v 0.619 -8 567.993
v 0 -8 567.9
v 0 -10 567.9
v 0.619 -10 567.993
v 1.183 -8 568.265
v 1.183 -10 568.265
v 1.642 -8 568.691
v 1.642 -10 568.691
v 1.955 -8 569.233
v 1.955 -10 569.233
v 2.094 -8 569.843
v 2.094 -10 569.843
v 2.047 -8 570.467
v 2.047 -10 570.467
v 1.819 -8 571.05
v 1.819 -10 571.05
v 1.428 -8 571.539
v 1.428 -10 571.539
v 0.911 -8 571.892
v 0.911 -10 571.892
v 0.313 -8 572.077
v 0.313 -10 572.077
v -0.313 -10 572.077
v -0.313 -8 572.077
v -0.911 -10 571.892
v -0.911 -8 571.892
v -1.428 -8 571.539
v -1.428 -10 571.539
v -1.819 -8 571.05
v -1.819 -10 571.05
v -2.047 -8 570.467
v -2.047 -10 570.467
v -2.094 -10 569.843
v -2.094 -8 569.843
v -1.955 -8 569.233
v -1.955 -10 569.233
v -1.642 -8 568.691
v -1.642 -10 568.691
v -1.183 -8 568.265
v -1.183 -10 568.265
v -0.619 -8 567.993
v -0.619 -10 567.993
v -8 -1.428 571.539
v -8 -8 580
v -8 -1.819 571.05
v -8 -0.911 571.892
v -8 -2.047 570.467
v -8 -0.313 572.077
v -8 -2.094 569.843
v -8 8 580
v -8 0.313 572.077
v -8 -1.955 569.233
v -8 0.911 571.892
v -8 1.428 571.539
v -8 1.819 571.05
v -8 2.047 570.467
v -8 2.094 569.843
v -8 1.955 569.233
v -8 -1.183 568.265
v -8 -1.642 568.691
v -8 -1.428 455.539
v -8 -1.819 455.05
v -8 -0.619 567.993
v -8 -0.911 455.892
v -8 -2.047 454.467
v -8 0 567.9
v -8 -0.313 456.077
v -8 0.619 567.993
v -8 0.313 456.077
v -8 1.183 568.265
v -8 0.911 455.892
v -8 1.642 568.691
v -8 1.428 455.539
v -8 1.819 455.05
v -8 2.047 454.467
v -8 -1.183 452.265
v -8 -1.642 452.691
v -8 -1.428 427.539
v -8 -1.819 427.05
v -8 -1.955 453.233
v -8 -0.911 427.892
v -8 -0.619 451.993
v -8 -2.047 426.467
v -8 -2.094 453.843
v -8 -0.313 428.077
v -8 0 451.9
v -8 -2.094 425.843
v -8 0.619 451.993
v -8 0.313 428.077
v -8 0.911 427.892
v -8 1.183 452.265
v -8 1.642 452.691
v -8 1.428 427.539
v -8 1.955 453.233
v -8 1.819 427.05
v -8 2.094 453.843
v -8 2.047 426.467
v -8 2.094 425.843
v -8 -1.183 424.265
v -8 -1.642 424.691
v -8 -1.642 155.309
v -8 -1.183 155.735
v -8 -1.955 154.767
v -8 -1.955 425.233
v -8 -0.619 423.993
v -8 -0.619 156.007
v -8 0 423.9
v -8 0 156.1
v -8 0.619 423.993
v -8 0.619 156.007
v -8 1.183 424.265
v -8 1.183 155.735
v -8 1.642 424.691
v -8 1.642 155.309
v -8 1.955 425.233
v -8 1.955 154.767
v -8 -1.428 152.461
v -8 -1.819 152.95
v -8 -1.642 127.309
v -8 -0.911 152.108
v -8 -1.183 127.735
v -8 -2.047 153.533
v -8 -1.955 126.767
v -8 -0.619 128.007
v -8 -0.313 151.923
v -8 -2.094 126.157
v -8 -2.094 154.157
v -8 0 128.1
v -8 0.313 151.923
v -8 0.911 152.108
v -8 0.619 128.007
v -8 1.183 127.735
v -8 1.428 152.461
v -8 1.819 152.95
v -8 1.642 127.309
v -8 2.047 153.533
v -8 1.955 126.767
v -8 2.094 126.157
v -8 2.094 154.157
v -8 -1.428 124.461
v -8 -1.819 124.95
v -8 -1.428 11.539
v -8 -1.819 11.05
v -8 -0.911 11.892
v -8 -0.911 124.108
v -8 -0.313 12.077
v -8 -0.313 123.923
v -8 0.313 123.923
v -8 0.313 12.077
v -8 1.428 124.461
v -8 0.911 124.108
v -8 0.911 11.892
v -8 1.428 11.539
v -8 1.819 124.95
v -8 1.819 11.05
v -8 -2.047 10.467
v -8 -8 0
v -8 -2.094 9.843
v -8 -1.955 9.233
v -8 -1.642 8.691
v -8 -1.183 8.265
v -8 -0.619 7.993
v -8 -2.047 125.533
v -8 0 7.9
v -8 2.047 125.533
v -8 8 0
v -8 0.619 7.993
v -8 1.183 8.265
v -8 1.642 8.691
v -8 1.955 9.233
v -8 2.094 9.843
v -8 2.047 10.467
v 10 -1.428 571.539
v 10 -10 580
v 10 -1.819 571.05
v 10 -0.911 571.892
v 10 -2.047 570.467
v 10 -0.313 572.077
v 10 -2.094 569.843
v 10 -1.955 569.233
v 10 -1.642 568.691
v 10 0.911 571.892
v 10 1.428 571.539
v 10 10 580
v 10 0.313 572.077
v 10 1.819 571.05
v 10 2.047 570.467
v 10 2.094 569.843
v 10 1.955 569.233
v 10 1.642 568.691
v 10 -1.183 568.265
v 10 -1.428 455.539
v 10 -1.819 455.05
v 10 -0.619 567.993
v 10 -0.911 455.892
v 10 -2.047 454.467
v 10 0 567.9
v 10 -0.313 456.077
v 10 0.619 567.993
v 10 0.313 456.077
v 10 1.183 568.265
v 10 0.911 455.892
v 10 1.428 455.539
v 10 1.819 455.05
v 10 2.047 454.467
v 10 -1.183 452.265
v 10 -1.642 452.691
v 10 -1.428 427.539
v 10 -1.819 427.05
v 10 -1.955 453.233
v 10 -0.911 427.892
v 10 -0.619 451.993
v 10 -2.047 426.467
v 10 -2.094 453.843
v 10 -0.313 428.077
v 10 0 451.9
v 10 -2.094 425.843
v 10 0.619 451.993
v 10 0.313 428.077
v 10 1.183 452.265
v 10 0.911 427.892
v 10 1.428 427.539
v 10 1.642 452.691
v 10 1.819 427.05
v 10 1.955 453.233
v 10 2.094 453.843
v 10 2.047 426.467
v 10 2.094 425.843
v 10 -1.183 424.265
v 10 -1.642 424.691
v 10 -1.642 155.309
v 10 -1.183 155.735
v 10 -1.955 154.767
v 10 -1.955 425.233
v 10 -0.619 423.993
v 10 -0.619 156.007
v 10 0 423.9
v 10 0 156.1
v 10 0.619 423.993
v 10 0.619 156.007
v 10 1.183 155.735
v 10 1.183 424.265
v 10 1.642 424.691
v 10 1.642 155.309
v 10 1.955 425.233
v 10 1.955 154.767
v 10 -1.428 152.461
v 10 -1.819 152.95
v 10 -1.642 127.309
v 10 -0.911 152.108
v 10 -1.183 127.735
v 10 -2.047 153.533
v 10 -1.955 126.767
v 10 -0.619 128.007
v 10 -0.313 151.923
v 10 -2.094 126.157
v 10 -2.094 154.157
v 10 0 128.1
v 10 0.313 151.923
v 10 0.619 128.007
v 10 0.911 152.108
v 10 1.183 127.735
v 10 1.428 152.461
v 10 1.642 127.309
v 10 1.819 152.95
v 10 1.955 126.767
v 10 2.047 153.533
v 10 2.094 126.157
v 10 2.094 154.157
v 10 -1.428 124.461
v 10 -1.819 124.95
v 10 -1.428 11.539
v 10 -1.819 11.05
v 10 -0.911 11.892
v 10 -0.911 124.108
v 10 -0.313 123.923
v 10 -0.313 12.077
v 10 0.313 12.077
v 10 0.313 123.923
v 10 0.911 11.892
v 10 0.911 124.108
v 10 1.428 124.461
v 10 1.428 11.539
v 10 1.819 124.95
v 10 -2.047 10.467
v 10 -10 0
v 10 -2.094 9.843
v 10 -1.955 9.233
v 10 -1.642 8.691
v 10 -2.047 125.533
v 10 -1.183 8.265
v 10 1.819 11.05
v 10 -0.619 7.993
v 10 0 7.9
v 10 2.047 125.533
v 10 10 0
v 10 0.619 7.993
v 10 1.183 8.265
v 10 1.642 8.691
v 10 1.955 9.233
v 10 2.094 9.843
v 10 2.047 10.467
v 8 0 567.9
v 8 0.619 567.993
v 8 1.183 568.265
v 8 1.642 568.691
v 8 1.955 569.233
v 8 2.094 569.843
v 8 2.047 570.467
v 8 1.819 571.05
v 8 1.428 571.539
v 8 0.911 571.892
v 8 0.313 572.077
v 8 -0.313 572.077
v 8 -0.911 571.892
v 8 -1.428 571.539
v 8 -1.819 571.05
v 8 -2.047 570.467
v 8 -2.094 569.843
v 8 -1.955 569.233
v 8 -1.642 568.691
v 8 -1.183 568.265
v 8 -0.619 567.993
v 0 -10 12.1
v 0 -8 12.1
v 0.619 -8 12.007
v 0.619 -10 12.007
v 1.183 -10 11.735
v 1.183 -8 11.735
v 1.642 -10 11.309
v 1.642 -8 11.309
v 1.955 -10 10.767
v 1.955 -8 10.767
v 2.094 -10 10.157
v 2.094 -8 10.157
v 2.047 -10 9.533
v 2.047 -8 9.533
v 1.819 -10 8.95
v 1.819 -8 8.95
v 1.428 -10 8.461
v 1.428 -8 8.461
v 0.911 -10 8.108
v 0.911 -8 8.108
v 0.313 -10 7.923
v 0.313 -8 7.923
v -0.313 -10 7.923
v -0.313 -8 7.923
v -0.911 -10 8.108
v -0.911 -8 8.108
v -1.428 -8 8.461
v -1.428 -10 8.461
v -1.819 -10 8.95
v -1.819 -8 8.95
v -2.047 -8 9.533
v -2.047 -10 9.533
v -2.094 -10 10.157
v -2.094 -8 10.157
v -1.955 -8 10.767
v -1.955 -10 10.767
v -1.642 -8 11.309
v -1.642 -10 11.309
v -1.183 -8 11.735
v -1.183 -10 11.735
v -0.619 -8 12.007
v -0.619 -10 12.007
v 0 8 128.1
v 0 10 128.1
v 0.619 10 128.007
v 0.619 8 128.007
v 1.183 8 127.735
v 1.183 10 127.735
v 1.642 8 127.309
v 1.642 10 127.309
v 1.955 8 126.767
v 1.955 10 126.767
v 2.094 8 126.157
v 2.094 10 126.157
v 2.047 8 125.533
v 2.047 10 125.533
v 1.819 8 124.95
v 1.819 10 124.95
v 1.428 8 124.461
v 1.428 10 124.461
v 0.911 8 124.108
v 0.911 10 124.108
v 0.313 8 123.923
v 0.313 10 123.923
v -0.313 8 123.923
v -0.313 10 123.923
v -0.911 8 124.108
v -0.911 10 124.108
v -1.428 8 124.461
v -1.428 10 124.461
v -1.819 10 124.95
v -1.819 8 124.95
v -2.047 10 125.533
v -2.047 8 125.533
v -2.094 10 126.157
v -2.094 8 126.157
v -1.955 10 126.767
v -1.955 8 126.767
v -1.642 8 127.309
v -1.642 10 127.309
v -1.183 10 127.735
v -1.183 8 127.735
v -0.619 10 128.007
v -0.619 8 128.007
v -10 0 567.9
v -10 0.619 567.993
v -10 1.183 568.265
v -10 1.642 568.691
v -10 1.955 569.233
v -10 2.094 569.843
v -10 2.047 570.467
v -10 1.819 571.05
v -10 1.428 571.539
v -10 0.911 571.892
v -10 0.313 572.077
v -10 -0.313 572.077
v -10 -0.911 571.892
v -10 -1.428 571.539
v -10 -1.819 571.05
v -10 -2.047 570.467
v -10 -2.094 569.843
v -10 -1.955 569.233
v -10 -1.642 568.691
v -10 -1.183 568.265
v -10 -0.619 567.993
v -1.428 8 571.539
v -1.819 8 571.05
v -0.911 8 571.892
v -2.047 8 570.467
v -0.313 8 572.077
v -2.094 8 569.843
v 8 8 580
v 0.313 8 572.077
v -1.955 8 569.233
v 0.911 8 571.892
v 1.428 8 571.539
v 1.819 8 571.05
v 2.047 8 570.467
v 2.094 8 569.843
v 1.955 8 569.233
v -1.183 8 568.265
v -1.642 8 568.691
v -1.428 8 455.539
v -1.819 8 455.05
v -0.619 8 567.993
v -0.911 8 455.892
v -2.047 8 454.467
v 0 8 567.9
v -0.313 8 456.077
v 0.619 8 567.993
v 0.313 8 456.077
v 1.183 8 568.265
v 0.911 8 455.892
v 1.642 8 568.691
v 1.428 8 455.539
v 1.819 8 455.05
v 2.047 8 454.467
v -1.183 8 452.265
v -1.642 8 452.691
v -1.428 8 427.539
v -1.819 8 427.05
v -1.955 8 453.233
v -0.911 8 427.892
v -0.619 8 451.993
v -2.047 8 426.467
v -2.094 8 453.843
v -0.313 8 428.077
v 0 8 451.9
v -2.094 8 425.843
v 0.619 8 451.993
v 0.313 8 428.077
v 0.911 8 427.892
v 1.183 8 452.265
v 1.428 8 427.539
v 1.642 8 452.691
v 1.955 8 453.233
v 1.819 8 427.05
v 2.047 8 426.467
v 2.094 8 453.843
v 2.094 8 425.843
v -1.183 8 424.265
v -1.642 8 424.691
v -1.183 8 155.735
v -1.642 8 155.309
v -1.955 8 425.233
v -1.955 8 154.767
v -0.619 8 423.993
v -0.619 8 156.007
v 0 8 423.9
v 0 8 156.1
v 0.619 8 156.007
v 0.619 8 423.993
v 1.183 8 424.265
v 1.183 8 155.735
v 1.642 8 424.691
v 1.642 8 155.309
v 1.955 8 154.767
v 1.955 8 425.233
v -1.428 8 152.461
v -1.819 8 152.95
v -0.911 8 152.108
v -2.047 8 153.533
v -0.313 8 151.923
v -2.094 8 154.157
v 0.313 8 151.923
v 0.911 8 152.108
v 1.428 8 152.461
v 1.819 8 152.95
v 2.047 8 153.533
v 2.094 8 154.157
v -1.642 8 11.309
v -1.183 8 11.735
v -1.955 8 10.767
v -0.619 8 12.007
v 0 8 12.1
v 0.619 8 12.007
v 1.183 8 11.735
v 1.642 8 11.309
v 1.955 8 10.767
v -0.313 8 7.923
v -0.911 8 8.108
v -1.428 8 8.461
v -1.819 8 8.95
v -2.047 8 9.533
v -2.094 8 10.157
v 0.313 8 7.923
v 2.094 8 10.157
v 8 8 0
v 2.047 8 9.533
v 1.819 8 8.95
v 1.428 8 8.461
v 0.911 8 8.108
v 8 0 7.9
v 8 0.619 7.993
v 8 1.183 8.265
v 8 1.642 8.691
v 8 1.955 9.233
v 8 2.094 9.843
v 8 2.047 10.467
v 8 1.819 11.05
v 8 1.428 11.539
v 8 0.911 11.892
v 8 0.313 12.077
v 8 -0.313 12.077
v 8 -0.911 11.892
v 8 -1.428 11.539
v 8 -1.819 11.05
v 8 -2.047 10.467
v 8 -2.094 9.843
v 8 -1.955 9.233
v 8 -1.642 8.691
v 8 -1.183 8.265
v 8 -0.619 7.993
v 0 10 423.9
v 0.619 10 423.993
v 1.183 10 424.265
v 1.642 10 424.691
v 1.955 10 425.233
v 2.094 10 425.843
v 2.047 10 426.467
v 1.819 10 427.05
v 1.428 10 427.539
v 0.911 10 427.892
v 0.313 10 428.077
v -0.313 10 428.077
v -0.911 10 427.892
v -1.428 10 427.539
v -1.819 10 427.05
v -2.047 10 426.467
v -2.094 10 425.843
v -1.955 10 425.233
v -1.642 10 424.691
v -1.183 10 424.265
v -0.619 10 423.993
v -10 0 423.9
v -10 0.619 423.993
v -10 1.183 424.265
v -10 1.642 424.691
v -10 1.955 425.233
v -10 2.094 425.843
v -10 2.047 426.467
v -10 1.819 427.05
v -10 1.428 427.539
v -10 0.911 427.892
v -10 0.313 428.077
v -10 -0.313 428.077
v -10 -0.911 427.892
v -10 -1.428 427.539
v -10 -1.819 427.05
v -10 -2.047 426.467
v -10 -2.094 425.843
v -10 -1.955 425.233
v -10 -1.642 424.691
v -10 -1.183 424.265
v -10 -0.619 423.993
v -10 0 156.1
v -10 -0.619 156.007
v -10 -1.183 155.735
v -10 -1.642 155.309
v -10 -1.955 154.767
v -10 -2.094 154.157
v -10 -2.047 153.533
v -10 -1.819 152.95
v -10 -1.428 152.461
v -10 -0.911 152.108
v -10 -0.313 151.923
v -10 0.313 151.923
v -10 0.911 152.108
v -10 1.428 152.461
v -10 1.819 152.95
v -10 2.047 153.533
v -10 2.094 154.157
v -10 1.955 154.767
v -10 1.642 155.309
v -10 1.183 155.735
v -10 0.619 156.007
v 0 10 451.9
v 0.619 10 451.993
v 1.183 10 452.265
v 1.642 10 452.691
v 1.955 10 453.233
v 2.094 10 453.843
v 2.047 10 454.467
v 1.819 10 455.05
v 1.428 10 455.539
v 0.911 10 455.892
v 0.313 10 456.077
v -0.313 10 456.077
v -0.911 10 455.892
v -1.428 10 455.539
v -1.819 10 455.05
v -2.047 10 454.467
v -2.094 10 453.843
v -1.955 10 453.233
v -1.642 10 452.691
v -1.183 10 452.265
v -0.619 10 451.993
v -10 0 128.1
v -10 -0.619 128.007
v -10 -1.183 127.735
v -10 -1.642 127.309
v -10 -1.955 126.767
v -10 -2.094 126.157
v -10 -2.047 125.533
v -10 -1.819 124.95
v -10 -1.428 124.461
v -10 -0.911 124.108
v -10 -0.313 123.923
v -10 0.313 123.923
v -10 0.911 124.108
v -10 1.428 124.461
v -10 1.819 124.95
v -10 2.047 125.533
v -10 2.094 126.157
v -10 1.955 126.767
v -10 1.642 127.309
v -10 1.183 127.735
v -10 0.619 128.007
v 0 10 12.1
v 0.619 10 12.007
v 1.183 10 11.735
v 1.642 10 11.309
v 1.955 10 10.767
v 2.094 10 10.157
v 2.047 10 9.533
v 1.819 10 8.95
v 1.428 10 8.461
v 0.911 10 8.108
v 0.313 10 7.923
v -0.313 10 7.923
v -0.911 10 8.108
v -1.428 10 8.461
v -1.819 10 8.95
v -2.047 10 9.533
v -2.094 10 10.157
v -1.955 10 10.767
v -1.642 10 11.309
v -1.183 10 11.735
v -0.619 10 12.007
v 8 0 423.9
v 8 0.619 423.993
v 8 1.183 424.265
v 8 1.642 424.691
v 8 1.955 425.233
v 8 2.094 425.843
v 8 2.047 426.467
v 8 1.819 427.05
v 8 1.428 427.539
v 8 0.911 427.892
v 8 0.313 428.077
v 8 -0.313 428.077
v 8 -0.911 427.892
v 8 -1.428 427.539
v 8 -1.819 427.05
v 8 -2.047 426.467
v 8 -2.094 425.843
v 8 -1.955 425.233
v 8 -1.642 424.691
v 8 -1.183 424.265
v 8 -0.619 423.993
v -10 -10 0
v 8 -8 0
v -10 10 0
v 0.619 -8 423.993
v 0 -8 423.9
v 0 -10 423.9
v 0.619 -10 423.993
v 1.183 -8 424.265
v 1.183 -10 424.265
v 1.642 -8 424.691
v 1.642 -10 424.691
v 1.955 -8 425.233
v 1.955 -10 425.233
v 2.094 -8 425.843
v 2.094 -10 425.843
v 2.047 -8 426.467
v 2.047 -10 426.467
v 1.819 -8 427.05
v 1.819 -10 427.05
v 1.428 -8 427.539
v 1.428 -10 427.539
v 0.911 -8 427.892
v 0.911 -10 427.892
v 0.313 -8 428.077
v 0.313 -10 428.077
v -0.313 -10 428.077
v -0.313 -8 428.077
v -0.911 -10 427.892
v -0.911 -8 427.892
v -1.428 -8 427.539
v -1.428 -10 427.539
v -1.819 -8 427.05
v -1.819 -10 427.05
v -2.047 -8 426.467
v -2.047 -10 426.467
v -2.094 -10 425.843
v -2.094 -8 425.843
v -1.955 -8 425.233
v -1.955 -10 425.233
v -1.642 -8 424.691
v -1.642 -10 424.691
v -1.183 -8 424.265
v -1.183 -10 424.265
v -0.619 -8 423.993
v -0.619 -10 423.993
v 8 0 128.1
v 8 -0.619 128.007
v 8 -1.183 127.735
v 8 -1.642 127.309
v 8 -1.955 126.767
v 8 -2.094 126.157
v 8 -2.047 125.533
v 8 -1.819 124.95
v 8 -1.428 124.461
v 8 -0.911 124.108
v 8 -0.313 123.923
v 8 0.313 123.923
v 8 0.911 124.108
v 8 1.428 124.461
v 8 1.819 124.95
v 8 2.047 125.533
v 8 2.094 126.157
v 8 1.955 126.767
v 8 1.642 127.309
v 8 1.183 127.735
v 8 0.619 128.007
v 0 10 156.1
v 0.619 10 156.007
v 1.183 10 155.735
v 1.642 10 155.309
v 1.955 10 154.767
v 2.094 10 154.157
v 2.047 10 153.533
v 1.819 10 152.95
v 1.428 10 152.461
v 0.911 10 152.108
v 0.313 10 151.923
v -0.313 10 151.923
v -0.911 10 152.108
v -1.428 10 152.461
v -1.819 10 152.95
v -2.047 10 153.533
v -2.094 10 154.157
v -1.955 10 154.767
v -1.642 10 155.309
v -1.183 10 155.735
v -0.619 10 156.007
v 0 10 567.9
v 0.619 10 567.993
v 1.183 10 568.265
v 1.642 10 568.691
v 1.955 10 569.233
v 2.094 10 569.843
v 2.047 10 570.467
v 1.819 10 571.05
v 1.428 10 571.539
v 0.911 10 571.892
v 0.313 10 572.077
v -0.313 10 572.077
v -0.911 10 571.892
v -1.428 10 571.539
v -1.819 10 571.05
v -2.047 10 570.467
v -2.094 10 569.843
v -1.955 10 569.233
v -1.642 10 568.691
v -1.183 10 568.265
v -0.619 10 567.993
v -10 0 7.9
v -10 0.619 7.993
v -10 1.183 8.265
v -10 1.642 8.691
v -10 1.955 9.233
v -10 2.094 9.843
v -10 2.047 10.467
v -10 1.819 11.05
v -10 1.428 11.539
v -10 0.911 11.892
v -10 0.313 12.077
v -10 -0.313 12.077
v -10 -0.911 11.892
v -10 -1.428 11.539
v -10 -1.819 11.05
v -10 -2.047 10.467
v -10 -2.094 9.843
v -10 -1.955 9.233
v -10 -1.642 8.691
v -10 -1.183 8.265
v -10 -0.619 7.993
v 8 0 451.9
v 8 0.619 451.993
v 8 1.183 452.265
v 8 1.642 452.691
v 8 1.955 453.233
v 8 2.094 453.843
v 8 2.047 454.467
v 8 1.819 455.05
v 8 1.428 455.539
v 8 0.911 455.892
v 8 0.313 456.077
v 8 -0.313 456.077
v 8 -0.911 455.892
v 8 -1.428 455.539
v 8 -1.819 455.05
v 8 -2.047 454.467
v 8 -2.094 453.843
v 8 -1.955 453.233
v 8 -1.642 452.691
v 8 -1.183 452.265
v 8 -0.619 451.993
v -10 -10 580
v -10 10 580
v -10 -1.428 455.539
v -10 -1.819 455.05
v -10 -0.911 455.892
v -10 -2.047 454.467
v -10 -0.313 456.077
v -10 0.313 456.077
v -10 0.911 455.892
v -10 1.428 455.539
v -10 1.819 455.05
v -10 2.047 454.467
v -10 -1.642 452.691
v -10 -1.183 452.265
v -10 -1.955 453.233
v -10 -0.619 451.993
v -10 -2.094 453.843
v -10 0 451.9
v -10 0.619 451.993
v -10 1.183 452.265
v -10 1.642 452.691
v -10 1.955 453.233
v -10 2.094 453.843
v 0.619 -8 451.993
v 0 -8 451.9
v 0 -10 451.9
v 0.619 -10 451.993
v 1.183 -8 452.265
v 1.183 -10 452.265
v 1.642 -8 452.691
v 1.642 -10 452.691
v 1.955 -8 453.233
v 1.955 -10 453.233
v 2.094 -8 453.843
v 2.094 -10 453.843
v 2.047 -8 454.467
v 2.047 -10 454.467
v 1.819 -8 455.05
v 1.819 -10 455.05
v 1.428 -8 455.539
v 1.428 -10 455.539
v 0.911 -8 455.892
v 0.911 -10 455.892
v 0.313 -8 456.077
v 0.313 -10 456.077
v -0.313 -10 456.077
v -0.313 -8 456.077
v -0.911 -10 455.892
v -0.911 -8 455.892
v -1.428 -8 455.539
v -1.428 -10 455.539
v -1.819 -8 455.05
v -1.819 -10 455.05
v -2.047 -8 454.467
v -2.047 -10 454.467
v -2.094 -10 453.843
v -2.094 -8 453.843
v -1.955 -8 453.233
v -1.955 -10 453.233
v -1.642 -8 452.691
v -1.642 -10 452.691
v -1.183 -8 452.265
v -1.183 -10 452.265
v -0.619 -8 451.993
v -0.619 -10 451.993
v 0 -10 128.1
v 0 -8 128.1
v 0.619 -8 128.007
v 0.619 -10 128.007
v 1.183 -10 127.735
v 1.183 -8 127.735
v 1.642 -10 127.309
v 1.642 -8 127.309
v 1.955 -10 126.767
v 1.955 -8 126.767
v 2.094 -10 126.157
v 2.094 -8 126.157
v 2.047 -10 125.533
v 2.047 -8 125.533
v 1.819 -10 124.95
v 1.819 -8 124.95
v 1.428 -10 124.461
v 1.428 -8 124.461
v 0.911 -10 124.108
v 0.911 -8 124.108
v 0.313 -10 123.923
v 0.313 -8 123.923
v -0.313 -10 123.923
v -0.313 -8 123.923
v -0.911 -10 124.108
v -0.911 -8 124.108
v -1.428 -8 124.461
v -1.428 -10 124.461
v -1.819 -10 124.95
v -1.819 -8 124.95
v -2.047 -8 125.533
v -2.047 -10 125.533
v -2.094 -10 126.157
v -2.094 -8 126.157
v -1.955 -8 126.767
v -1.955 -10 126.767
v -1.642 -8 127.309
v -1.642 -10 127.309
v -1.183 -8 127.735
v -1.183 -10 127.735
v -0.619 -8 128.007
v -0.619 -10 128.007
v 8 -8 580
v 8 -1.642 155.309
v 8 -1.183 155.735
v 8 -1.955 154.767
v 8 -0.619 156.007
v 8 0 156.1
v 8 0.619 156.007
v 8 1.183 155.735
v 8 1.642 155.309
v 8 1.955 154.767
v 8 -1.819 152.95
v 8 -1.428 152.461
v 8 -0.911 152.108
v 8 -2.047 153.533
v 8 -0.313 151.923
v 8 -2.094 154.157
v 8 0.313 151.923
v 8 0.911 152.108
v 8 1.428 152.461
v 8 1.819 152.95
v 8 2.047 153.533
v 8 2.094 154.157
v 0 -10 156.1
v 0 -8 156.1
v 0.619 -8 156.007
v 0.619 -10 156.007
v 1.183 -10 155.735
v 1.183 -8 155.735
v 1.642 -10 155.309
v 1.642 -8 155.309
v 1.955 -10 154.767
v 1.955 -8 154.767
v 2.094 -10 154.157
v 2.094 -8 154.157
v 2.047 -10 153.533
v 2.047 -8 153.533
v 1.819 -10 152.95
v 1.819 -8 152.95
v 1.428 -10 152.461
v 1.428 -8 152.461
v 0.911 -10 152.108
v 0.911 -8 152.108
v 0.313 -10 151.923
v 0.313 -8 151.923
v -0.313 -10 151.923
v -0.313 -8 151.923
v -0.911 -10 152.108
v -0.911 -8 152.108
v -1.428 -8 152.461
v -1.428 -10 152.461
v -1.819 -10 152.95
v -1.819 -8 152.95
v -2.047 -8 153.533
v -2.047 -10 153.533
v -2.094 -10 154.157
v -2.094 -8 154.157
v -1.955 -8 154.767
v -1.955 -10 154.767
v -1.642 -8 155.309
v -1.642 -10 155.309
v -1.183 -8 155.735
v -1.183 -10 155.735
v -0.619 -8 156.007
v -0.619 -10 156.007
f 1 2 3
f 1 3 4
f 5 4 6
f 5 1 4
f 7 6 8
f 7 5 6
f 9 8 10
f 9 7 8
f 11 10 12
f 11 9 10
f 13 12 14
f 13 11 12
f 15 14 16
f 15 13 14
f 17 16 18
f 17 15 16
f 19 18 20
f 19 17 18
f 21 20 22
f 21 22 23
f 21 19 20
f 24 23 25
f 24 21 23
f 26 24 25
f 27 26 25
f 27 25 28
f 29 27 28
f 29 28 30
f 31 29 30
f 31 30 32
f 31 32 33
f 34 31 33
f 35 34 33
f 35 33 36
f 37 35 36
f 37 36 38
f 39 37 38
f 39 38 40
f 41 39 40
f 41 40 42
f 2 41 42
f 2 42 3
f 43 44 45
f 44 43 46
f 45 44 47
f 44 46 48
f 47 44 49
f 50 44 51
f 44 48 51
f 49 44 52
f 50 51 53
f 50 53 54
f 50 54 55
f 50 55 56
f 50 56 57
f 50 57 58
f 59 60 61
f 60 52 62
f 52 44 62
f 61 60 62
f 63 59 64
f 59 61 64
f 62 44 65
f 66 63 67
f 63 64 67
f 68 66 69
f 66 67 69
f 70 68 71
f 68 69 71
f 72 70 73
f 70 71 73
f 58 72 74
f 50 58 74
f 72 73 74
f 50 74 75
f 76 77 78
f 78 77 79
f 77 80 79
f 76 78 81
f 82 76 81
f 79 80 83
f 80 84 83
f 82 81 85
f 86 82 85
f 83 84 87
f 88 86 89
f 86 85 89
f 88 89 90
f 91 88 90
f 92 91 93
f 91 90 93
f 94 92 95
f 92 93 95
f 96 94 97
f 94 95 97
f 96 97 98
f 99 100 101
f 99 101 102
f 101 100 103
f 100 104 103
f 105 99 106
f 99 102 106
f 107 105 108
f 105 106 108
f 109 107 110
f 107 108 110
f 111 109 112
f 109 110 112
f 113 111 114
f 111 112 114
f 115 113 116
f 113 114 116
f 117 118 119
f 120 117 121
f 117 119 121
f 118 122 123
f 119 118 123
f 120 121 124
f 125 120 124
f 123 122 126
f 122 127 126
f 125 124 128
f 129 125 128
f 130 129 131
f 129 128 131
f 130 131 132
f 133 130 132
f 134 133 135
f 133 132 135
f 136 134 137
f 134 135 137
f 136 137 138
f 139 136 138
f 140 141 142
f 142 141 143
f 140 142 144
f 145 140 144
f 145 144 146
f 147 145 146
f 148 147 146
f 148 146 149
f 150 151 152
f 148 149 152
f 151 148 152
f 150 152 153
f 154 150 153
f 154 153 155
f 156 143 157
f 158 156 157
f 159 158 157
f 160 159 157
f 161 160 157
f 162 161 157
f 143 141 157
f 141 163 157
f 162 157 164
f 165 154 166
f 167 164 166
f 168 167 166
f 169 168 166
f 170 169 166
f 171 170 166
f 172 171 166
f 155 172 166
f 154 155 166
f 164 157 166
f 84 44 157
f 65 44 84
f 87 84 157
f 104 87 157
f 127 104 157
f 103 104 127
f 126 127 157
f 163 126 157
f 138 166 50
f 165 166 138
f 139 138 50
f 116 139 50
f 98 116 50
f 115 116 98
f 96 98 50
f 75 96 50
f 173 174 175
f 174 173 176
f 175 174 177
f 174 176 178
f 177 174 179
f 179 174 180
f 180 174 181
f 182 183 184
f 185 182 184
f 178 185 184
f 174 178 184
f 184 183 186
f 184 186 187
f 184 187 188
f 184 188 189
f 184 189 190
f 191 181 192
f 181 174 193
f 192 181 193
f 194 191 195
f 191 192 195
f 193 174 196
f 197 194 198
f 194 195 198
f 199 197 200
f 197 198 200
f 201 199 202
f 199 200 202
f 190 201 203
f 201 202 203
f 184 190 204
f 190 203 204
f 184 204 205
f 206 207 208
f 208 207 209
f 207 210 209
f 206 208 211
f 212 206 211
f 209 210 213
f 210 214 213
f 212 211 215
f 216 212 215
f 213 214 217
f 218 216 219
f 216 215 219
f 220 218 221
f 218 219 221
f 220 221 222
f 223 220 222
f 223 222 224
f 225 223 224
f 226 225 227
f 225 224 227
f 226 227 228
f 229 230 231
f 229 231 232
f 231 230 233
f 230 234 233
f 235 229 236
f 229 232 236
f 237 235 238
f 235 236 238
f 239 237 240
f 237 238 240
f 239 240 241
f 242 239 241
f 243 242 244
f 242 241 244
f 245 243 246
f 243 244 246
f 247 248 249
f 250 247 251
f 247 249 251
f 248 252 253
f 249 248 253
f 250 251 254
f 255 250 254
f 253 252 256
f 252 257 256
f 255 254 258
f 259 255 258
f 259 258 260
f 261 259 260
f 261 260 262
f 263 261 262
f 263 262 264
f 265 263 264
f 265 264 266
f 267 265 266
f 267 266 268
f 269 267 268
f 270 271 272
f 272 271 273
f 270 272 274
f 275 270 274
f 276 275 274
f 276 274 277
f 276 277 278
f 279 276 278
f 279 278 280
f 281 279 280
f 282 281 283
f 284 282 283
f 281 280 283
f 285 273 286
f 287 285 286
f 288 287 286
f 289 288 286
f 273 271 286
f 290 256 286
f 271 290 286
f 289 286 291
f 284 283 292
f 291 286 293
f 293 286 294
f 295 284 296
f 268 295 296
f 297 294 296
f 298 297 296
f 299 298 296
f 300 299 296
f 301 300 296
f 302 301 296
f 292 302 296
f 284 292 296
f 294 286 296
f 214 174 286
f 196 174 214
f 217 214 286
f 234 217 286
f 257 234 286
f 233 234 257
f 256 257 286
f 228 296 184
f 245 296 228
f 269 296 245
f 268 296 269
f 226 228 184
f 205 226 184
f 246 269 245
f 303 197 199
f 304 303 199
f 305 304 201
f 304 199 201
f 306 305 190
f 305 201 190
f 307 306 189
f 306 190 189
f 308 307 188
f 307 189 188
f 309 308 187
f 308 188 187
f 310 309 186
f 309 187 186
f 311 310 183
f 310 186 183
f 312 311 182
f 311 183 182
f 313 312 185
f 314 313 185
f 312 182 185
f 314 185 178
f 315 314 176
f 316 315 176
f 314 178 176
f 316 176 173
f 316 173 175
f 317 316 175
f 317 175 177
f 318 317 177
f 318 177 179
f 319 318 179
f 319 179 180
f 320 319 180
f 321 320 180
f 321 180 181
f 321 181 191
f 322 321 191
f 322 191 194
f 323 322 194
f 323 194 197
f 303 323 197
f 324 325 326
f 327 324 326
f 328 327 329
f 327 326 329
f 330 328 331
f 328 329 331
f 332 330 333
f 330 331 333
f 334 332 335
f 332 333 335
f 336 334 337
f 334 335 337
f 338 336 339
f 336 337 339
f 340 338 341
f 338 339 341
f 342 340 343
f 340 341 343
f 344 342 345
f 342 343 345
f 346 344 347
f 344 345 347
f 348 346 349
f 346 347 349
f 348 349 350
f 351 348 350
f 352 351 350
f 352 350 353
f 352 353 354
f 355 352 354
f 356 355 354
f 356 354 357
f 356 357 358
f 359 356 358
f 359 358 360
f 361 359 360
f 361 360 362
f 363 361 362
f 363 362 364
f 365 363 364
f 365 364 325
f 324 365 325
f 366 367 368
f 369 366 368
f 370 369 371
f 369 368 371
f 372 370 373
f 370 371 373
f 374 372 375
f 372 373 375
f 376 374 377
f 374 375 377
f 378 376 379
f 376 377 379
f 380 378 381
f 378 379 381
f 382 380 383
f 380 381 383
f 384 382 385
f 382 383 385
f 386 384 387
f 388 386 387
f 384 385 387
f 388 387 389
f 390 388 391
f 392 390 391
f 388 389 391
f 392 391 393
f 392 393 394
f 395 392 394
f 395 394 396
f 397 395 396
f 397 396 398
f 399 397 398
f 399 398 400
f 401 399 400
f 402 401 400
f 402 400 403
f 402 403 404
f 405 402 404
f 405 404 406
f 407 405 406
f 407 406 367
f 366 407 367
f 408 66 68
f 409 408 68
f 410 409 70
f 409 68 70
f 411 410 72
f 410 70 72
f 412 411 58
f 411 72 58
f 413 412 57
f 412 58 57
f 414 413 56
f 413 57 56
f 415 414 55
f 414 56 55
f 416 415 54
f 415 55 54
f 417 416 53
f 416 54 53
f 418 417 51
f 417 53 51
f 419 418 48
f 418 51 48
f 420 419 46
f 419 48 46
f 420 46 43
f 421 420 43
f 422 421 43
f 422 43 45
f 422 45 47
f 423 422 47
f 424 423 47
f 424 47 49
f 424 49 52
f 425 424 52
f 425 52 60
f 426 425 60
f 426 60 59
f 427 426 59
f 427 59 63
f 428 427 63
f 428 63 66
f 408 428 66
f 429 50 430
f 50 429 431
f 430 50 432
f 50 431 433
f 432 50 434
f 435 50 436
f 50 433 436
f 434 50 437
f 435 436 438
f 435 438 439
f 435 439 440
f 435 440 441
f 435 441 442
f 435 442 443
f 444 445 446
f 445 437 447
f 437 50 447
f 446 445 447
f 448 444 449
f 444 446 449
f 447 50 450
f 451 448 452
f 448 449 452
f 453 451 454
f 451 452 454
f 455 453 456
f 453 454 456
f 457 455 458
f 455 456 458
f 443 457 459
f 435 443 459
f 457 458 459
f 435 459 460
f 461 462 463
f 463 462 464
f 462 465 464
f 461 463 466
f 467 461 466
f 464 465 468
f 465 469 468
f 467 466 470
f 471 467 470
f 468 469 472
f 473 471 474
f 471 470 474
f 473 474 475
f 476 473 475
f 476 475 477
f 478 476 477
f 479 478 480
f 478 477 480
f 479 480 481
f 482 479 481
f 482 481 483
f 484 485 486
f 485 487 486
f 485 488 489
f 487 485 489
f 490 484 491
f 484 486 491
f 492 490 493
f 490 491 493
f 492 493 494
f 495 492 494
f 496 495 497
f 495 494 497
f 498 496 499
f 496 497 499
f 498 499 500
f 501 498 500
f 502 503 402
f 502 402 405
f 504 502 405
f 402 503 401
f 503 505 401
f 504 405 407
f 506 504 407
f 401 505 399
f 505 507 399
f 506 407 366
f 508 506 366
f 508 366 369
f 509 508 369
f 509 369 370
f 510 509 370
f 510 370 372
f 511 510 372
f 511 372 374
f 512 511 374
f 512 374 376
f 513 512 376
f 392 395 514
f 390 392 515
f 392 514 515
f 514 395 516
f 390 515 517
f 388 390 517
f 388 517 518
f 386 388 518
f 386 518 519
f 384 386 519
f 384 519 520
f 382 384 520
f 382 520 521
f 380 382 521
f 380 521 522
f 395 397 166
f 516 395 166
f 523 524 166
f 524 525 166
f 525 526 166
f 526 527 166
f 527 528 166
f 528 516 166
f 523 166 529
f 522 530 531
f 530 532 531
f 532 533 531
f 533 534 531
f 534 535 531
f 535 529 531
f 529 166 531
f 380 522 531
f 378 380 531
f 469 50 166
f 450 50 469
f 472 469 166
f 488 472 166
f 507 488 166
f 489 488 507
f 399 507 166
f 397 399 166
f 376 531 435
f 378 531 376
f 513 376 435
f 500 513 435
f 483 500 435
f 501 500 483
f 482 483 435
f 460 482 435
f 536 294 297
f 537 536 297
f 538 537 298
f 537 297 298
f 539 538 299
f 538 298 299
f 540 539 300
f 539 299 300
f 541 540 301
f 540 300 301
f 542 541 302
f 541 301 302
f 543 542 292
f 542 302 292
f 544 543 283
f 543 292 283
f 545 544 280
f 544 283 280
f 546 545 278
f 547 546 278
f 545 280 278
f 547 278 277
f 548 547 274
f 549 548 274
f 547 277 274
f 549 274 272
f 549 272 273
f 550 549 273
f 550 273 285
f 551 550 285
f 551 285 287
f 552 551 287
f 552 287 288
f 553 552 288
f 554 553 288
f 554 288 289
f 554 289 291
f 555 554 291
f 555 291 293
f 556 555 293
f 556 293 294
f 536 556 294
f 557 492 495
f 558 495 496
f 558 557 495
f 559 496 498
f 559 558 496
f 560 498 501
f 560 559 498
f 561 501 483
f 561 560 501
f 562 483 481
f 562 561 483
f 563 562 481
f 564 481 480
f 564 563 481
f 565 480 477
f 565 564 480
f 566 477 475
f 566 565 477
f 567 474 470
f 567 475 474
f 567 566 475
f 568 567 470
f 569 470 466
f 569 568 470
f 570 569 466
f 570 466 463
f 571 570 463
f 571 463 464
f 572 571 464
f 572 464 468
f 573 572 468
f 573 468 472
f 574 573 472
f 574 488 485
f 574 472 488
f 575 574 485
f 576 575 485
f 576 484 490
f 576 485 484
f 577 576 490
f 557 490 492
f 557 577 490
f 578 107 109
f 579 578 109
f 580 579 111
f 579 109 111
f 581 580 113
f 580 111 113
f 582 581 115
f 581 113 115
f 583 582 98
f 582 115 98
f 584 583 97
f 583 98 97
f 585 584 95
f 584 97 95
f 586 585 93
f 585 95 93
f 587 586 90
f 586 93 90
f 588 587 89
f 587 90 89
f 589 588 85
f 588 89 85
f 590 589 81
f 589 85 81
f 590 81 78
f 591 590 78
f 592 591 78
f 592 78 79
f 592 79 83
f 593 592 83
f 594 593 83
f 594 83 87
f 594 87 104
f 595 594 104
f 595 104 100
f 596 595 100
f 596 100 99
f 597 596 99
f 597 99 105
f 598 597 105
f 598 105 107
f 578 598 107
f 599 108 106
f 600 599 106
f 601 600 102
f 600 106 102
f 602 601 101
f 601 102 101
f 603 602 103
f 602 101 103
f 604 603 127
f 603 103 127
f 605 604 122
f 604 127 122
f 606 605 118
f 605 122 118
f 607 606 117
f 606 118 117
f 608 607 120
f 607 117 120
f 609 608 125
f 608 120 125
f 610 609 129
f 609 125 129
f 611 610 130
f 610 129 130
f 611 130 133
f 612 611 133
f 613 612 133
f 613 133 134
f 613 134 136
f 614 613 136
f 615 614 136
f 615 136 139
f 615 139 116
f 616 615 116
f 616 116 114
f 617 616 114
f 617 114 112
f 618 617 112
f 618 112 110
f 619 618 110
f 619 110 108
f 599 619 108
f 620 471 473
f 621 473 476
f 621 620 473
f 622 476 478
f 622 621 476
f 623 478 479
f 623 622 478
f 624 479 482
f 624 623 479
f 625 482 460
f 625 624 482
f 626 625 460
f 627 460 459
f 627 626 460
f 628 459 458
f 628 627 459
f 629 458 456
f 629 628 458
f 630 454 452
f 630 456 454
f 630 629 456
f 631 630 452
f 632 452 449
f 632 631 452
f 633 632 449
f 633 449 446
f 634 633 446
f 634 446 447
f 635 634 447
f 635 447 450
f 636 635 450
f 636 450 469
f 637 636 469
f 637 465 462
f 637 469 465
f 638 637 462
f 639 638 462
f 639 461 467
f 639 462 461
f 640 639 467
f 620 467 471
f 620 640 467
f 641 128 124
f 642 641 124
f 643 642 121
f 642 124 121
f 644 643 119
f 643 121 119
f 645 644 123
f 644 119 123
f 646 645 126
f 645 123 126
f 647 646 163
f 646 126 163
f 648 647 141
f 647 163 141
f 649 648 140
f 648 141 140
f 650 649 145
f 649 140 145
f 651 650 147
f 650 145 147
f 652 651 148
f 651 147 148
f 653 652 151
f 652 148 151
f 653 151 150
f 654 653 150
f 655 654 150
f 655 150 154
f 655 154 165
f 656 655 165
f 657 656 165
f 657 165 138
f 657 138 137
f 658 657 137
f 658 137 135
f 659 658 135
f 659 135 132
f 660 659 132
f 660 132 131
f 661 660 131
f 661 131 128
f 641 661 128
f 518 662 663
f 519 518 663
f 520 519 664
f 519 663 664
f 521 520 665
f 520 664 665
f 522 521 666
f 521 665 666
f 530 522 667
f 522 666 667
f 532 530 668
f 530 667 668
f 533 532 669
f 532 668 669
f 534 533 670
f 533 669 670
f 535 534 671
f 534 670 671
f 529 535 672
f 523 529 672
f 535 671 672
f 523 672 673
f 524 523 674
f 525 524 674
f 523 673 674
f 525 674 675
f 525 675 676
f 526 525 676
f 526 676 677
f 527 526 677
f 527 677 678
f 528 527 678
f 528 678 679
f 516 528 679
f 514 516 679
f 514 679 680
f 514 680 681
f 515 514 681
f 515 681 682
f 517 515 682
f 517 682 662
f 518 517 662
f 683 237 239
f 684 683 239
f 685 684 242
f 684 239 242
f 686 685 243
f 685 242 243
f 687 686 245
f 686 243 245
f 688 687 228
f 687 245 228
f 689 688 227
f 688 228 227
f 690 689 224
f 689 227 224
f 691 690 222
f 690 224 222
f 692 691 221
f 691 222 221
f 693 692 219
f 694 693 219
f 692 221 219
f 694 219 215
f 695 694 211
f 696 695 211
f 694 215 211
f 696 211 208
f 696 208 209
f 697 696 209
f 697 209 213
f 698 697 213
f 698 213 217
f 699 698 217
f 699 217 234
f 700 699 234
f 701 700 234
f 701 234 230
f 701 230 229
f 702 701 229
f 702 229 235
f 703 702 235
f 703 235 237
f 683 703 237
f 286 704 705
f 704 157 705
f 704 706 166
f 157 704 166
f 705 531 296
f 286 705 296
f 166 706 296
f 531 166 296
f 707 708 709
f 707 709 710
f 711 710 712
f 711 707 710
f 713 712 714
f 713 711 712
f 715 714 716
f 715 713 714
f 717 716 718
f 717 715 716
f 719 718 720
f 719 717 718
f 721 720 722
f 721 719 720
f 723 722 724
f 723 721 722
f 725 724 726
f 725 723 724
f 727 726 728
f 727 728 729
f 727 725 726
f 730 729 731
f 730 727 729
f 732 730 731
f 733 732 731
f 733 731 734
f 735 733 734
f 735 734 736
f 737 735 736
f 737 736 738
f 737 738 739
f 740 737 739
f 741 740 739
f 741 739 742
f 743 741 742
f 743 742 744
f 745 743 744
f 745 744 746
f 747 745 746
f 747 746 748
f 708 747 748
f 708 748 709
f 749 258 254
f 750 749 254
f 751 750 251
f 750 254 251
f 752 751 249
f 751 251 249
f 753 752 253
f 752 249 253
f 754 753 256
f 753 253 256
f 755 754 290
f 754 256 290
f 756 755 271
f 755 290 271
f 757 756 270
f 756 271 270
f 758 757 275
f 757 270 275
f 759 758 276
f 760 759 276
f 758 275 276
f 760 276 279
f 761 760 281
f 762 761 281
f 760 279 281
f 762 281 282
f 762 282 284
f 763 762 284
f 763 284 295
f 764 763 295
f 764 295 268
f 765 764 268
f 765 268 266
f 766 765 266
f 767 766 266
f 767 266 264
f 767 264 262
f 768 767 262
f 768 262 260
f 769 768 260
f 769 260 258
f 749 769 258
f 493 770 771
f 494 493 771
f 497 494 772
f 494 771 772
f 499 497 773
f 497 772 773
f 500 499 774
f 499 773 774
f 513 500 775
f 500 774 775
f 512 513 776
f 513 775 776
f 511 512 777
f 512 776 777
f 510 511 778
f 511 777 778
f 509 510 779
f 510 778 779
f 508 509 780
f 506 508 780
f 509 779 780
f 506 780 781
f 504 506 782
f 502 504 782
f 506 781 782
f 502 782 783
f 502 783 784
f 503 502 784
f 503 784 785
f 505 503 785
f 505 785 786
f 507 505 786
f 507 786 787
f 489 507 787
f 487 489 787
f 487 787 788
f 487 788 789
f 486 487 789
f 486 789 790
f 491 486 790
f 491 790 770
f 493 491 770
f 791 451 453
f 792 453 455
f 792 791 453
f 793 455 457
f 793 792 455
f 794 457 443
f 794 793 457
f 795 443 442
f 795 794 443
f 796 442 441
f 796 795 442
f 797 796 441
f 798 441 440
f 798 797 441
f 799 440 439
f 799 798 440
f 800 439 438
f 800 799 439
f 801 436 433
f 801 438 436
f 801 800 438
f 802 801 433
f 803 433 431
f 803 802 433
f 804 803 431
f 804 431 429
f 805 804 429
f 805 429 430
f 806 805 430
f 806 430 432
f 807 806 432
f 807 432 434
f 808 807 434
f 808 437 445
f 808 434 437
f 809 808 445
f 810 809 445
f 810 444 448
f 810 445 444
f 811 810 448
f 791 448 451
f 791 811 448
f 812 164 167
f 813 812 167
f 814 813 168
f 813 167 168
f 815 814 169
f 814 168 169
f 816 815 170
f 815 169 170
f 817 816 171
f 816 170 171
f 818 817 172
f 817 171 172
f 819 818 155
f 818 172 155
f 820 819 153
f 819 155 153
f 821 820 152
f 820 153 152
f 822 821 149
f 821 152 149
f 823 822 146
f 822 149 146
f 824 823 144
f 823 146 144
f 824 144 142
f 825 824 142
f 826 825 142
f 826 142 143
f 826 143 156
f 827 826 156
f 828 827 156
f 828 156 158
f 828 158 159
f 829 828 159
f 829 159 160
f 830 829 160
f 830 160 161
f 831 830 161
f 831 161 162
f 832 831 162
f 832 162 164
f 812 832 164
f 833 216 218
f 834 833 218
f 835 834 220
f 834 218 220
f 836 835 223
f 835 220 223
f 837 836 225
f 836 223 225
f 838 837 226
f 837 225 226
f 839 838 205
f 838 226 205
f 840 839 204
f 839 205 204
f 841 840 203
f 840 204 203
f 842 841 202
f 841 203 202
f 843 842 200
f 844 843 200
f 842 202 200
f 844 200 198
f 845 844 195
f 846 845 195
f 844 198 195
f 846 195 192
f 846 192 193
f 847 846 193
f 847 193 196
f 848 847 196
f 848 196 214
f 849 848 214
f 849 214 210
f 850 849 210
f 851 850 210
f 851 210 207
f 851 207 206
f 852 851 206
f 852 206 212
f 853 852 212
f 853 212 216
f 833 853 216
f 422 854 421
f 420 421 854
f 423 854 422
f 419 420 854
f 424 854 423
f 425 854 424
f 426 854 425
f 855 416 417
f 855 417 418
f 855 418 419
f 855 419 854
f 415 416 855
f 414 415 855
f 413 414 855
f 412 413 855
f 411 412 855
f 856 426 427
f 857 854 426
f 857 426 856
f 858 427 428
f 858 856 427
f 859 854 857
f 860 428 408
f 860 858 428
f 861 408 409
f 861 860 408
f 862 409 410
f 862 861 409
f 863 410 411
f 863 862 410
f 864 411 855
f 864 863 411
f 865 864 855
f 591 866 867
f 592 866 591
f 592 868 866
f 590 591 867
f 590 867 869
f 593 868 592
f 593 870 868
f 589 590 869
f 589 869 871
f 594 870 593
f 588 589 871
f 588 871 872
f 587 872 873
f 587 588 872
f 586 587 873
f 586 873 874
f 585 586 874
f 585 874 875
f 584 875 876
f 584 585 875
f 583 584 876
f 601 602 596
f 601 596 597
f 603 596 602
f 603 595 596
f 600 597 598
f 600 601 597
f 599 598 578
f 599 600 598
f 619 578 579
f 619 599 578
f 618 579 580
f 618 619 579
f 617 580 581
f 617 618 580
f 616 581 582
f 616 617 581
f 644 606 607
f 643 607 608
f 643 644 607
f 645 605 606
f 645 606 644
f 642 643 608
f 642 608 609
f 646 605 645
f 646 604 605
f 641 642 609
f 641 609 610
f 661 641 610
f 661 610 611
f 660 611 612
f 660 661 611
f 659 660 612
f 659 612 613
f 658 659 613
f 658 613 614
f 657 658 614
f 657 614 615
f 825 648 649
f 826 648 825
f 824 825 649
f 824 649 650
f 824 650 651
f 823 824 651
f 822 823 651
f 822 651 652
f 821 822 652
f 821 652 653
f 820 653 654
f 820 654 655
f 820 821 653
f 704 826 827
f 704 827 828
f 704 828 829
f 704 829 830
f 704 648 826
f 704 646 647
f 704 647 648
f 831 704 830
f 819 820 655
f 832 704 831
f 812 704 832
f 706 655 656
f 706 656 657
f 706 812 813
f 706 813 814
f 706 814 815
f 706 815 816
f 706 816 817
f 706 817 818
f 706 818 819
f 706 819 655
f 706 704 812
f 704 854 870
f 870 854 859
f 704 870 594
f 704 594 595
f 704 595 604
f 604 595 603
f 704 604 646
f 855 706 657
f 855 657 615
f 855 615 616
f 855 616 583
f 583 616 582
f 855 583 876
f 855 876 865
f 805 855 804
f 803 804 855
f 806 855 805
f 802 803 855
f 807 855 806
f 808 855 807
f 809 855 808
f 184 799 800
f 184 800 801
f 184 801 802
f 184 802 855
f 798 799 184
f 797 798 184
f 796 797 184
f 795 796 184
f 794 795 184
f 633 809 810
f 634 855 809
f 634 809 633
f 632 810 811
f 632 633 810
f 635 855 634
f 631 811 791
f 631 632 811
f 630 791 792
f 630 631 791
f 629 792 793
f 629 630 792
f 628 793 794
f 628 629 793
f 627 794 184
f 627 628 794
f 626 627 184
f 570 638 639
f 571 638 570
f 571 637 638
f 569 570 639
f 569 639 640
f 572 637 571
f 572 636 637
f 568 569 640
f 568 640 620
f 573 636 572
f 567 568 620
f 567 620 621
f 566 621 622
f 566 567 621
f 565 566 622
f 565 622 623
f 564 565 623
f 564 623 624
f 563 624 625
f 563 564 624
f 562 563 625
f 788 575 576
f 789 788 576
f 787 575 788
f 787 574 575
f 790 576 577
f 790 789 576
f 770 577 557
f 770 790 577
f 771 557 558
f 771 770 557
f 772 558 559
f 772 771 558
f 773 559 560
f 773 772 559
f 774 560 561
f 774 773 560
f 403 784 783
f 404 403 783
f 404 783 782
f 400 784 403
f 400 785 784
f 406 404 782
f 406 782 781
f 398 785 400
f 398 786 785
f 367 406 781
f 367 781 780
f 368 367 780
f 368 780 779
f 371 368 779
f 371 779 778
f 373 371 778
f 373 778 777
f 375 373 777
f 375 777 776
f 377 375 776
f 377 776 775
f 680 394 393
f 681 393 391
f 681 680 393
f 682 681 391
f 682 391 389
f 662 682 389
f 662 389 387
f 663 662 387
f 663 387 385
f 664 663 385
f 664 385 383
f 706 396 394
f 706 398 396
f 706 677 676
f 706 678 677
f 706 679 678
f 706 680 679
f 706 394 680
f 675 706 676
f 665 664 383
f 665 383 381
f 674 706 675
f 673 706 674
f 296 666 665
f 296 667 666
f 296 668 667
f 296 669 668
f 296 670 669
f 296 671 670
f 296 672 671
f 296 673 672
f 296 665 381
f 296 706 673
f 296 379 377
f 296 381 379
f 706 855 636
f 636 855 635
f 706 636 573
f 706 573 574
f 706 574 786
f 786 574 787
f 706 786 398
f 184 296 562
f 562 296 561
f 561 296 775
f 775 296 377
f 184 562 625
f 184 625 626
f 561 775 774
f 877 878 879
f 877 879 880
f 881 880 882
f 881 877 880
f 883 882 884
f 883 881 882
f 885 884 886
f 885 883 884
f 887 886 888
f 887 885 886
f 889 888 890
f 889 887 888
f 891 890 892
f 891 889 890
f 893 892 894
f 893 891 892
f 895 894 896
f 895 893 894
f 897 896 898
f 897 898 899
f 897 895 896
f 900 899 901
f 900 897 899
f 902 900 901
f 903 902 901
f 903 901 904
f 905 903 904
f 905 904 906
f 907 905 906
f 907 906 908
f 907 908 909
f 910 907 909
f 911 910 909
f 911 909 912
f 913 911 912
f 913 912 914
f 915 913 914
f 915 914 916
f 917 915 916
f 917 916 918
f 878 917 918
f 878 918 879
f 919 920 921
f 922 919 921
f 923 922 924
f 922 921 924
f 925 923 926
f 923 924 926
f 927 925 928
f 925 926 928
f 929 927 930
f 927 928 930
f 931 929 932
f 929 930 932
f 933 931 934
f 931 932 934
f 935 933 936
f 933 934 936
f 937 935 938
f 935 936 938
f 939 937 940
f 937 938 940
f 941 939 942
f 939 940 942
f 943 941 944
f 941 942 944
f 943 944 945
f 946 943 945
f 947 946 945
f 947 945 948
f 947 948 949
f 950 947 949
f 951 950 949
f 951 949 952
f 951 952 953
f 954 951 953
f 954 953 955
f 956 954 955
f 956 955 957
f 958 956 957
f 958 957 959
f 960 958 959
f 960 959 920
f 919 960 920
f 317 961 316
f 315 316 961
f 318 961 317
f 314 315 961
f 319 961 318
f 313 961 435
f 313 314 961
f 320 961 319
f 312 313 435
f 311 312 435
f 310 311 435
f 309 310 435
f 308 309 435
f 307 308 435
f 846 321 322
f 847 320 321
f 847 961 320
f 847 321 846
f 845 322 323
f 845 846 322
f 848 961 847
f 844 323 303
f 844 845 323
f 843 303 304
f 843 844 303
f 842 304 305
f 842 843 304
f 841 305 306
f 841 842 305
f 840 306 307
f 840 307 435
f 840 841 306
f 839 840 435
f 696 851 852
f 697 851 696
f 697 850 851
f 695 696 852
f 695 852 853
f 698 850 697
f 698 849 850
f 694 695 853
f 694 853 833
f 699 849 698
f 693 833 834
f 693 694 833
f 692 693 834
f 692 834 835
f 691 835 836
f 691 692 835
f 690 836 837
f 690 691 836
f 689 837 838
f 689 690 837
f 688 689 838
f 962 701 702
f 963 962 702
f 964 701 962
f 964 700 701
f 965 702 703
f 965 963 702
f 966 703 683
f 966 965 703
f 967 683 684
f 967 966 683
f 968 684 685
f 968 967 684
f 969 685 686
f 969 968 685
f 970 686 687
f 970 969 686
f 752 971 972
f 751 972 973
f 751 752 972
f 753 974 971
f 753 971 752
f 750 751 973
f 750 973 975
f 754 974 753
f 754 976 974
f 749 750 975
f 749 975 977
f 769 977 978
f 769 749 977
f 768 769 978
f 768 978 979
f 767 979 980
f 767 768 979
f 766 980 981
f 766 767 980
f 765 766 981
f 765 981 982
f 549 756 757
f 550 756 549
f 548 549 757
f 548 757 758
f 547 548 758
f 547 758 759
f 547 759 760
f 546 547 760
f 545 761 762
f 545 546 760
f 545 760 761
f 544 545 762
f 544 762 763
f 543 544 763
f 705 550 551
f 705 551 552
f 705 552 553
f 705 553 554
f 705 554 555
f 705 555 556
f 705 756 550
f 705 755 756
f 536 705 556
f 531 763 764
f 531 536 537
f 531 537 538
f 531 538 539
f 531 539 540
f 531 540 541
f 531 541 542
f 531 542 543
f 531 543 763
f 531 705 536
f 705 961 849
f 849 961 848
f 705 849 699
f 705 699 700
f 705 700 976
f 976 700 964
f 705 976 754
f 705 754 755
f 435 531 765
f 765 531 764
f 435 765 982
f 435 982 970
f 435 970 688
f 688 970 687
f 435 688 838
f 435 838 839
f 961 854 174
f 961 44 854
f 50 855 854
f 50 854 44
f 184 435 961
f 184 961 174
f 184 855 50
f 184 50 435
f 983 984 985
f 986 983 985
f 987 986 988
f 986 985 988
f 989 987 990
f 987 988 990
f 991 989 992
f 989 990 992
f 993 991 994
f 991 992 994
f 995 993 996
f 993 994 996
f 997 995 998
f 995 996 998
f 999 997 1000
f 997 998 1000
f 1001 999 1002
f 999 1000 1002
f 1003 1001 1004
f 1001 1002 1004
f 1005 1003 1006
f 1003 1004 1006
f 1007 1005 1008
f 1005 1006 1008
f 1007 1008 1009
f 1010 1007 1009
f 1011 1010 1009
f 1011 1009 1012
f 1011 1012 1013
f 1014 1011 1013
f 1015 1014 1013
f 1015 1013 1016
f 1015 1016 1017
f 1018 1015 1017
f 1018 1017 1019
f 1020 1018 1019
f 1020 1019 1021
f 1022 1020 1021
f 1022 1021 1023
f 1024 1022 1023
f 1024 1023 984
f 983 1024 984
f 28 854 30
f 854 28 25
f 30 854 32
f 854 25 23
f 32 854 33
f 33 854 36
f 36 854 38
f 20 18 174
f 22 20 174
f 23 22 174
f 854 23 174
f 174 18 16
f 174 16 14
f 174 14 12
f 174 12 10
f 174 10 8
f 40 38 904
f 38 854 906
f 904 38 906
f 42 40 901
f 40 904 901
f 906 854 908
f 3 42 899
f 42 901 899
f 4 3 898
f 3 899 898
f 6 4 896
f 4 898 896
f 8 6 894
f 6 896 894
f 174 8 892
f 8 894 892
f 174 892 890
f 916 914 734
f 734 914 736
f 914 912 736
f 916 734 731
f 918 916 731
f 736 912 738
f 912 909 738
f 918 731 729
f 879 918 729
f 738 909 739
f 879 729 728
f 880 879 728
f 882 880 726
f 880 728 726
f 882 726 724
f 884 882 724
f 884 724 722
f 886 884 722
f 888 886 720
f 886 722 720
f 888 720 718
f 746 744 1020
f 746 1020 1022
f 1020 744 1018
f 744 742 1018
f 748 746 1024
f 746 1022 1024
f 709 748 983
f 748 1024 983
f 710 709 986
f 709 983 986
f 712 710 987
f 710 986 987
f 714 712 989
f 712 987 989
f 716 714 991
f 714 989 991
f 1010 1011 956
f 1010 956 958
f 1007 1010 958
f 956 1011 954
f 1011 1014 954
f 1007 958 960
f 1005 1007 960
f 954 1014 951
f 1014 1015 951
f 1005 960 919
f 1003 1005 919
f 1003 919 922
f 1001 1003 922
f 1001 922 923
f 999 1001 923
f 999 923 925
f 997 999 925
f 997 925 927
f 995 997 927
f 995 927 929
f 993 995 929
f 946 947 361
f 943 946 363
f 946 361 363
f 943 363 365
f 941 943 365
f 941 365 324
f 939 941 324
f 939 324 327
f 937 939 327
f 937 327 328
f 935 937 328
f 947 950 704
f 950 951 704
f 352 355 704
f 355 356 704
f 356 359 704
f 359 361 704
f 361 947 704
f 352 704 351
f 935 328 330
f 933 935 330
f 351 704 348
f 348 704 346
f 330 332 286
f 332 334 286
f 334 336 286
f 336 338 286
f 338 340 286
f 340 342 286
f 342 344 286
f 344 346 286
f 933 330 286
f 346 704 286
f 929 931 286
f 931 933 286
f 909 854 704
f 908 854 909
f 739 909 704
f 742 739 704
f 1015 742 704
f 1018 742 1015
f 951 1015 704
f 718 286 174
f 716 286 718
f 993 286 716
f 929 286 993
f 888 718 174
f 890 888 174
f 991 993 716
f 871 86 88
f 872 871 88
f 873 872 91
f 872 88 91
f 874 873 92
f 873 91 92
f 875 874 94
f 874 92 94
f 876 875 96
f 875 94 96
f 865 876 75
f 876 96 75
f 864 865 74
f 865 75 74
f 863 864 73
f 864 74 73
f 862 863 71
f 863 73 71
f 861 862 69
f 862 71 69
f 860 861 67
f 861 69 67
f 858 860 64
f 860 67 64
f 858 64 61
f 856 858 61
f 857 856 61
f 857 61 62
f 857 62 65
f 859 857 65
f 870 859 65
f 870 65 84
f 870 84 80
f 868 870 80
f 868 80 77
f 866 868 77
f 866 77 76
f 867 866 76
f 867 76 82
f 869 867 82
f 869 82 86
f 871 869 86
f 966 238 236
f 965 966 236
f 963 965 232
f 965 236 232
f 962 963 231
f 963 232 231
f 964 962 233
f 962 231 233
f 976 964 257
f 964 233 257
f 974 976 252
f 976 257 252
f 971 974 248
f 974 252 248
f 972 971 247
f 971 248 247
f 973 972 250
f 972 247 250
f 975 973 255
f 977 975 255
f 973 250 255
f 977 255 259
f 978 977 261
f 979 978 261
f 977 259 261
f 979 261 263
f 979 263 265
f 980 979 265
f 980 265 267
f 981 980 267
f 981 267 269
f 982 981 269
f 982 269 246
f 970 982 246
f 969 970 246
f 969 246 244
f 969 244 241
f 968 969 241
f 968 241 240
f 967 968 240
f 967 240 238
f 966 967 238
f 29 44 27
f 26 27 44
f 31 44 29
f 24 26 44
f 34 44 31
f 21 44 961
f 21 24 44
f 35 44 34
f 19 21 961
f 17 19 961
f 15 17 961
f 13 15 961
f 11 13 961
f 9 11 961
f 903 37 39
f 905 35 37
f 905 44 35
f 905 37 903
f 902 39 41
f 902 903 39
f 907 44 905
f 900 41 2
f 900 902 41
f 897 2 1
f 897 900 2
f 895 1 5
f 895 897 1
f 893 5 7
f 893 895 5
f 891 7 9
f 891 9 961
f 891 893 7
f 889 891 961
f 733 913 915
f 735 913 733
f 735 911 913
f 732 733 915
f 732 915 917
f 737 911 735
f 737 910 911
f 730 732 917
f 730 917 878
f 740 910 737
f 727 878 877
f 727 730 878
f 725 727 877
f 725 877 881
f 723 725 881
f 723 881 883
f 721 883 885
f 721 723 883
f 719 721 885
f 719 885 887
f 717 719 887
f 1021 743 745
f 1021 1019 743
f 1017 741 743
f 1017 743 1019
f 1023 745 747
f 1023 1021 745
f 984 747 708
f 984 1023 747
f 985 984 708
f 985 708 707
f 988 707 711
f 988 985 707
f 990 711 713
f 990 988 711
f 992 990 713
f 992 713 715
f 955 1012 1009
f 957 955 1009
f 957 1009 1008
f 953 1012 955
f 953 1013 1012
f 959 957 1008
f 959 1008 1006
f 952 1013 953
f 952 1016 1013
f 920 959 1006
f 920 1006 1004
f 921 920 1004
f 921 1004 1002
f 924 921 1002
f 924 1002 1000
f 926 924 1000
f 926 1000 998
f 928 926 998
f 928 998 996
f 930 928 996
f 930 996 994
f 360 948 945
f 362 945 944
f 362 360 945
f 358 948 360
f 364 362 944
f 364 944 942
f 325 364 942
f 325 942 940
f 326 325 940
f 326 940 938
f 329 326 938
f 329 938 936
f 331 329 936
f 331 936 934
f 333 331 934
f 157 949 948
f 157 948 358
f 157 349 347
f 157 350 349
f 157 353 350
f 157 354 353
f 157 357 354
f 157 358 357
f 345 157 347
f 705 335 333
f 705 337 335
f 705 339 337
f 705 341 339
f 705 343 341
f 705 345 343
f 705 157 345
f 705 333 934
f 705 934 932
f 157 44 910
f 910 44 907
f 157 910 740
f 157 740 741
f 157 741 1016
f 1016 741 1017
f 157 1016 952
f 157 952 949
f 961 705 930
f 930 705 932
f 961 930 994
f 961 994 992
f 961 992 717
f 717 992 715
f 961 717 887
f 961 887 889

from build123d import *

# Parameters (mm, degrees)
SKETCH_1_W          = 20
SKETCH_1_H          = 20
SKETCH_1_W_2        = 16
SKETCH_1_H_2        = 16
EXTRUDE_1_DEPTH     = 580
SKETCH_2_R          = 2.1
CUT_EXTRUDE_1_DEPTH = 20
SKETCH_3_R          = 2.1
CUT_EXTRUDE_2_DEPTH = 581.430874437


with BuildPart() as part:
    # 草图1 → 凸台-拉伸1 (new body)
    with BuildSketch(Plane.XY):
        Rectangle(SKETCH_1_W, SKETCH_1_H)
        Rectangle(SKETCH_1_W_2, SKETCH_1_H_2, mode=Mode.SUBTRACT)
    extrude(amount=EXTRUDE_1_DEPTH)

    # 草图2 → 切除-拉伸1 (cut)
    with BuildSketch(Plane(origin=(0, 10, 0), x_dir=(1, 0, 0), z_dir=(0, 1, 0))):
        with Locations(Location((0, -10, 0), (0, 0, 270))):
            Circle(SKETCH_2_R)
        with Locations(Location((0, -126, 0), (0, 0, 270))):
            Circle(SKETCH_2_R)
        with Locations(Location((0, -154, 0), (0, 0, 270))):
            Circle(SKETCH_2_R)
    cut_extrude_1 = extrude(amount=-CUT_EXTRUDE_1_DEPTH, mode=Mode.SUBTRACT)

    # 镜向1: 切除-拉伸1 across plane
    add(cut_extrude_1.mirror(Plane.XY.offset(290)), mode=Mode.SUBTRACT)

    # 草图3 → 切除-拉伸2 (cut, through all)
    with BuildSketch(Plane(origin=(10, 0, 0), x_dir=(0, 0, -1), z_dir=(1, 0, 0))):
        with Locations((-570, 0)):
            Circle(SKETCH_3_R)
        with Locations((-10, 0)):
            Circle(SKETCH_3_R)
        with Locations((-454, 0)):
            Circle(SKETCH_3_R)
        with Locations((-426, 0)):
            Circle(SKETCH_3_R)
        with Locations(Location((-126, 0, 0), (0, 0, 180))):
            Circle(SKETCH_3_R)
        with Locations(Location((-154, 0, 0), (0, 0, 180))):
            Circle(SKETCH_3_R)
    extrude(amount=-CUT_EXTRUDE_2_DEPTH, mode=Mode.SUBTRACT)


solid = part.part
